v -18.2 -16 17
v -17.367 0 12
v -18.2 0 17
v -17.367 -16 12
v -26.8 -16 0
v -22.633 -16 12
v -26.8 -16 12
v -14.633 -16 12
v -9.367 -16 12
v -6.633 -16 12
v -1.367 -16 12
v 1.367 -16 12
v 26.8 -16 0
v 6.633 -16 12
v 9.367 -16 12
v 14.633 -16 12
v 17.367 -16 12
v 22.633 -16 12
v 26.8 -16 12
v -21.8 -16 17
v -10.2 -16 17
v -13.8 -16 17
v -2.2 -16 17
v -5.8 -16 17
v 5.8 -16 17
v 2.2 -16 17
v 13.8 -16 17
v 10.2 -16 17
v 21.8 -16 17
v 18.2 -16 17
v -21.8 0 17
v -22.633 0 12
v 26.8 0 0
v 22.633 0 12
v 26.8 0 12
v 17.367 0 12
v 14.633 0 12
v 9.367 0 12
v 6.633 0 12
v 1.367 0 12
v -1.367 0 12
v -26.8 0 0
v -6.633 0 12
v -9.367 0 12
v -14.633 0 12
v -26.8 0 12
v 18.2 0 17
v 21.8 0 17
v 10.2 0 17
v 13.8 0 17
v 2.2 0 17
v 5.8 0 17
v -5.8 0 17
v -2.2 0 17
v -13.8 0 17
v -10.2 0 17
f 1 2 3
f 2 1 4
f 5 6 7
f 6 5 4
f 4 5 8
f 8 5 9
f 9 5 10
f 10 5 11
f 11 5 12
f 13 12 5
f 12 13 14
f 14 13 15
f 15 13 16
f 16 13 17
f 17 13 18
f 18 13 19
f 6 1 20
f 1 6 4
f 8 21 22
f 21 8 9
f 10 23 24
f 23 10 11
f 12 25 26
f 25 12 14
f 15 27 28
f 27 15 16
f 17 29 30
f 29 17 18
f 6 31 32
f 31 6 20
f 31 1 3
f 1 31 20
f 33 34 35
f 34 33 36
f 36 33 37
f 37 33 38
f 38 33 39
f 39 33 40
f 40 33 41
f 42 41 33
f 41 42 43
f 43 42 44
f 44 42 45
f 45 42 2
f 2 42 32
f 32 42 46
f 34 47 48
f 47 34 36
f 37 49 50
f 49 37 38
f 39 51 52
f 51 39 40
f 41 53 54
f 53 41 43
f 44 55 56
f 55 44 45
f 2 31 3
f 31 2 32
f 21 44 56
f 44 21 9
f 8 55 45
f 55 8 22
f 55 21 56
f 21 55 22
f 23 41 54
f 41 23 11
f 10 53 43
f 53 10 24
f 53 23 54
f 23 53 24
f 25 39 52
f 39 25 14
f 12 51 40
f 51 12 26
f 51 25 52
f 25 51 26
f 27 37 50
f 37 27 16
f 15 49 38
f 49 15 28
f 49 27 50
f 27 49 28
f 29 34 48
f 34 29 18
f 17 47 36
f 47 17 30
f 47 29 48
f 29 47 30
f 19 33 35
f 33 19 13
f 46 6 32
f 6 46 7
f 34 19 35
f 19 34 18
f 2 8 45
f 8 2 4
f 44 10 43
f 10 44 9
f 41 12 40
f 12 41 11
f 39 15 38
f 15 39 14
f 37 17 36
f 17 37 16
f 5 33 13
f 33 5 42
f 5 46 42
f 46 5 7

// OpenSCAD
$fn = 32;

// ----------------------------------------------------------------------
// Toothed rack, 6 teeth
// 8 mm pitch, 5 mm teeth
// ----------------------------------------------------------------------

// --- parameters (mm) ---
bar_w = 16;       // bar width (Y)
seat_tol = 0.05;  // tolerance at the seating features
free_tol = 0.3;   // general tolerance on the free sizes
bar_h = 12;       // bar height (Z)
teeth = 6;        // number of teeth
pitch = 8;        // tooth pitch
tooth_h = 5;      // tooth height above the bar
root_w = 5.6;     // tooth width at the root
crest_w = 3.6;    // tooth width at the crest

// --- derived feature positions (mm) ---
span = (teeth - 1) * pitch;  // = 40   distance between the outer teeth
bar_l = span + root_w + 8;   // = 53.6   bar length: teeth plus 4 mm at each end
tooth_x = -span / 2;         // = -20   X of the first tooth
height = bar_h + tooth_h;    // = 17   overall height
feature_centers = [
  [tooth_x + 0 * pitch, -bar_w / 2],
  [tooth_x + 1 * pitch, -bar_w / 2],
  [tooth_x + 2 * pitch, -bar_w / 2],
  [tooth_x + 3 * pitch, -bar_w / 2],
  [tooth_x + 4 * pitch, -bar_w / 2],
  [tooth_x + 5 * pitch, -bar_w / 2]
];   // tooth centre line, drives the tooth loop

// bar with a rack of teeth, one extruded trapezoium per centre
module rack_tooth() {
  linear_extrude(height = bar_w)
    polygon(points = [
      [0, 0],
      [root_w, 0],
      [root_w / 2 + crest_w / 2, tooth_h + 1],
      [root_w / 2 - crest_w / 2, tooth_h + 1]
    ]);
}

union() {
  translate([-bar_l / 2, -bar_w, 0]) cube([bar_l, bar_w, bar_h]);
  for (centre = feature_centers)
    translate([centre[0] - root_w / 2, 0, bar_h - 1]) rotate([90, 0, 0]) rack_tooth();
}
